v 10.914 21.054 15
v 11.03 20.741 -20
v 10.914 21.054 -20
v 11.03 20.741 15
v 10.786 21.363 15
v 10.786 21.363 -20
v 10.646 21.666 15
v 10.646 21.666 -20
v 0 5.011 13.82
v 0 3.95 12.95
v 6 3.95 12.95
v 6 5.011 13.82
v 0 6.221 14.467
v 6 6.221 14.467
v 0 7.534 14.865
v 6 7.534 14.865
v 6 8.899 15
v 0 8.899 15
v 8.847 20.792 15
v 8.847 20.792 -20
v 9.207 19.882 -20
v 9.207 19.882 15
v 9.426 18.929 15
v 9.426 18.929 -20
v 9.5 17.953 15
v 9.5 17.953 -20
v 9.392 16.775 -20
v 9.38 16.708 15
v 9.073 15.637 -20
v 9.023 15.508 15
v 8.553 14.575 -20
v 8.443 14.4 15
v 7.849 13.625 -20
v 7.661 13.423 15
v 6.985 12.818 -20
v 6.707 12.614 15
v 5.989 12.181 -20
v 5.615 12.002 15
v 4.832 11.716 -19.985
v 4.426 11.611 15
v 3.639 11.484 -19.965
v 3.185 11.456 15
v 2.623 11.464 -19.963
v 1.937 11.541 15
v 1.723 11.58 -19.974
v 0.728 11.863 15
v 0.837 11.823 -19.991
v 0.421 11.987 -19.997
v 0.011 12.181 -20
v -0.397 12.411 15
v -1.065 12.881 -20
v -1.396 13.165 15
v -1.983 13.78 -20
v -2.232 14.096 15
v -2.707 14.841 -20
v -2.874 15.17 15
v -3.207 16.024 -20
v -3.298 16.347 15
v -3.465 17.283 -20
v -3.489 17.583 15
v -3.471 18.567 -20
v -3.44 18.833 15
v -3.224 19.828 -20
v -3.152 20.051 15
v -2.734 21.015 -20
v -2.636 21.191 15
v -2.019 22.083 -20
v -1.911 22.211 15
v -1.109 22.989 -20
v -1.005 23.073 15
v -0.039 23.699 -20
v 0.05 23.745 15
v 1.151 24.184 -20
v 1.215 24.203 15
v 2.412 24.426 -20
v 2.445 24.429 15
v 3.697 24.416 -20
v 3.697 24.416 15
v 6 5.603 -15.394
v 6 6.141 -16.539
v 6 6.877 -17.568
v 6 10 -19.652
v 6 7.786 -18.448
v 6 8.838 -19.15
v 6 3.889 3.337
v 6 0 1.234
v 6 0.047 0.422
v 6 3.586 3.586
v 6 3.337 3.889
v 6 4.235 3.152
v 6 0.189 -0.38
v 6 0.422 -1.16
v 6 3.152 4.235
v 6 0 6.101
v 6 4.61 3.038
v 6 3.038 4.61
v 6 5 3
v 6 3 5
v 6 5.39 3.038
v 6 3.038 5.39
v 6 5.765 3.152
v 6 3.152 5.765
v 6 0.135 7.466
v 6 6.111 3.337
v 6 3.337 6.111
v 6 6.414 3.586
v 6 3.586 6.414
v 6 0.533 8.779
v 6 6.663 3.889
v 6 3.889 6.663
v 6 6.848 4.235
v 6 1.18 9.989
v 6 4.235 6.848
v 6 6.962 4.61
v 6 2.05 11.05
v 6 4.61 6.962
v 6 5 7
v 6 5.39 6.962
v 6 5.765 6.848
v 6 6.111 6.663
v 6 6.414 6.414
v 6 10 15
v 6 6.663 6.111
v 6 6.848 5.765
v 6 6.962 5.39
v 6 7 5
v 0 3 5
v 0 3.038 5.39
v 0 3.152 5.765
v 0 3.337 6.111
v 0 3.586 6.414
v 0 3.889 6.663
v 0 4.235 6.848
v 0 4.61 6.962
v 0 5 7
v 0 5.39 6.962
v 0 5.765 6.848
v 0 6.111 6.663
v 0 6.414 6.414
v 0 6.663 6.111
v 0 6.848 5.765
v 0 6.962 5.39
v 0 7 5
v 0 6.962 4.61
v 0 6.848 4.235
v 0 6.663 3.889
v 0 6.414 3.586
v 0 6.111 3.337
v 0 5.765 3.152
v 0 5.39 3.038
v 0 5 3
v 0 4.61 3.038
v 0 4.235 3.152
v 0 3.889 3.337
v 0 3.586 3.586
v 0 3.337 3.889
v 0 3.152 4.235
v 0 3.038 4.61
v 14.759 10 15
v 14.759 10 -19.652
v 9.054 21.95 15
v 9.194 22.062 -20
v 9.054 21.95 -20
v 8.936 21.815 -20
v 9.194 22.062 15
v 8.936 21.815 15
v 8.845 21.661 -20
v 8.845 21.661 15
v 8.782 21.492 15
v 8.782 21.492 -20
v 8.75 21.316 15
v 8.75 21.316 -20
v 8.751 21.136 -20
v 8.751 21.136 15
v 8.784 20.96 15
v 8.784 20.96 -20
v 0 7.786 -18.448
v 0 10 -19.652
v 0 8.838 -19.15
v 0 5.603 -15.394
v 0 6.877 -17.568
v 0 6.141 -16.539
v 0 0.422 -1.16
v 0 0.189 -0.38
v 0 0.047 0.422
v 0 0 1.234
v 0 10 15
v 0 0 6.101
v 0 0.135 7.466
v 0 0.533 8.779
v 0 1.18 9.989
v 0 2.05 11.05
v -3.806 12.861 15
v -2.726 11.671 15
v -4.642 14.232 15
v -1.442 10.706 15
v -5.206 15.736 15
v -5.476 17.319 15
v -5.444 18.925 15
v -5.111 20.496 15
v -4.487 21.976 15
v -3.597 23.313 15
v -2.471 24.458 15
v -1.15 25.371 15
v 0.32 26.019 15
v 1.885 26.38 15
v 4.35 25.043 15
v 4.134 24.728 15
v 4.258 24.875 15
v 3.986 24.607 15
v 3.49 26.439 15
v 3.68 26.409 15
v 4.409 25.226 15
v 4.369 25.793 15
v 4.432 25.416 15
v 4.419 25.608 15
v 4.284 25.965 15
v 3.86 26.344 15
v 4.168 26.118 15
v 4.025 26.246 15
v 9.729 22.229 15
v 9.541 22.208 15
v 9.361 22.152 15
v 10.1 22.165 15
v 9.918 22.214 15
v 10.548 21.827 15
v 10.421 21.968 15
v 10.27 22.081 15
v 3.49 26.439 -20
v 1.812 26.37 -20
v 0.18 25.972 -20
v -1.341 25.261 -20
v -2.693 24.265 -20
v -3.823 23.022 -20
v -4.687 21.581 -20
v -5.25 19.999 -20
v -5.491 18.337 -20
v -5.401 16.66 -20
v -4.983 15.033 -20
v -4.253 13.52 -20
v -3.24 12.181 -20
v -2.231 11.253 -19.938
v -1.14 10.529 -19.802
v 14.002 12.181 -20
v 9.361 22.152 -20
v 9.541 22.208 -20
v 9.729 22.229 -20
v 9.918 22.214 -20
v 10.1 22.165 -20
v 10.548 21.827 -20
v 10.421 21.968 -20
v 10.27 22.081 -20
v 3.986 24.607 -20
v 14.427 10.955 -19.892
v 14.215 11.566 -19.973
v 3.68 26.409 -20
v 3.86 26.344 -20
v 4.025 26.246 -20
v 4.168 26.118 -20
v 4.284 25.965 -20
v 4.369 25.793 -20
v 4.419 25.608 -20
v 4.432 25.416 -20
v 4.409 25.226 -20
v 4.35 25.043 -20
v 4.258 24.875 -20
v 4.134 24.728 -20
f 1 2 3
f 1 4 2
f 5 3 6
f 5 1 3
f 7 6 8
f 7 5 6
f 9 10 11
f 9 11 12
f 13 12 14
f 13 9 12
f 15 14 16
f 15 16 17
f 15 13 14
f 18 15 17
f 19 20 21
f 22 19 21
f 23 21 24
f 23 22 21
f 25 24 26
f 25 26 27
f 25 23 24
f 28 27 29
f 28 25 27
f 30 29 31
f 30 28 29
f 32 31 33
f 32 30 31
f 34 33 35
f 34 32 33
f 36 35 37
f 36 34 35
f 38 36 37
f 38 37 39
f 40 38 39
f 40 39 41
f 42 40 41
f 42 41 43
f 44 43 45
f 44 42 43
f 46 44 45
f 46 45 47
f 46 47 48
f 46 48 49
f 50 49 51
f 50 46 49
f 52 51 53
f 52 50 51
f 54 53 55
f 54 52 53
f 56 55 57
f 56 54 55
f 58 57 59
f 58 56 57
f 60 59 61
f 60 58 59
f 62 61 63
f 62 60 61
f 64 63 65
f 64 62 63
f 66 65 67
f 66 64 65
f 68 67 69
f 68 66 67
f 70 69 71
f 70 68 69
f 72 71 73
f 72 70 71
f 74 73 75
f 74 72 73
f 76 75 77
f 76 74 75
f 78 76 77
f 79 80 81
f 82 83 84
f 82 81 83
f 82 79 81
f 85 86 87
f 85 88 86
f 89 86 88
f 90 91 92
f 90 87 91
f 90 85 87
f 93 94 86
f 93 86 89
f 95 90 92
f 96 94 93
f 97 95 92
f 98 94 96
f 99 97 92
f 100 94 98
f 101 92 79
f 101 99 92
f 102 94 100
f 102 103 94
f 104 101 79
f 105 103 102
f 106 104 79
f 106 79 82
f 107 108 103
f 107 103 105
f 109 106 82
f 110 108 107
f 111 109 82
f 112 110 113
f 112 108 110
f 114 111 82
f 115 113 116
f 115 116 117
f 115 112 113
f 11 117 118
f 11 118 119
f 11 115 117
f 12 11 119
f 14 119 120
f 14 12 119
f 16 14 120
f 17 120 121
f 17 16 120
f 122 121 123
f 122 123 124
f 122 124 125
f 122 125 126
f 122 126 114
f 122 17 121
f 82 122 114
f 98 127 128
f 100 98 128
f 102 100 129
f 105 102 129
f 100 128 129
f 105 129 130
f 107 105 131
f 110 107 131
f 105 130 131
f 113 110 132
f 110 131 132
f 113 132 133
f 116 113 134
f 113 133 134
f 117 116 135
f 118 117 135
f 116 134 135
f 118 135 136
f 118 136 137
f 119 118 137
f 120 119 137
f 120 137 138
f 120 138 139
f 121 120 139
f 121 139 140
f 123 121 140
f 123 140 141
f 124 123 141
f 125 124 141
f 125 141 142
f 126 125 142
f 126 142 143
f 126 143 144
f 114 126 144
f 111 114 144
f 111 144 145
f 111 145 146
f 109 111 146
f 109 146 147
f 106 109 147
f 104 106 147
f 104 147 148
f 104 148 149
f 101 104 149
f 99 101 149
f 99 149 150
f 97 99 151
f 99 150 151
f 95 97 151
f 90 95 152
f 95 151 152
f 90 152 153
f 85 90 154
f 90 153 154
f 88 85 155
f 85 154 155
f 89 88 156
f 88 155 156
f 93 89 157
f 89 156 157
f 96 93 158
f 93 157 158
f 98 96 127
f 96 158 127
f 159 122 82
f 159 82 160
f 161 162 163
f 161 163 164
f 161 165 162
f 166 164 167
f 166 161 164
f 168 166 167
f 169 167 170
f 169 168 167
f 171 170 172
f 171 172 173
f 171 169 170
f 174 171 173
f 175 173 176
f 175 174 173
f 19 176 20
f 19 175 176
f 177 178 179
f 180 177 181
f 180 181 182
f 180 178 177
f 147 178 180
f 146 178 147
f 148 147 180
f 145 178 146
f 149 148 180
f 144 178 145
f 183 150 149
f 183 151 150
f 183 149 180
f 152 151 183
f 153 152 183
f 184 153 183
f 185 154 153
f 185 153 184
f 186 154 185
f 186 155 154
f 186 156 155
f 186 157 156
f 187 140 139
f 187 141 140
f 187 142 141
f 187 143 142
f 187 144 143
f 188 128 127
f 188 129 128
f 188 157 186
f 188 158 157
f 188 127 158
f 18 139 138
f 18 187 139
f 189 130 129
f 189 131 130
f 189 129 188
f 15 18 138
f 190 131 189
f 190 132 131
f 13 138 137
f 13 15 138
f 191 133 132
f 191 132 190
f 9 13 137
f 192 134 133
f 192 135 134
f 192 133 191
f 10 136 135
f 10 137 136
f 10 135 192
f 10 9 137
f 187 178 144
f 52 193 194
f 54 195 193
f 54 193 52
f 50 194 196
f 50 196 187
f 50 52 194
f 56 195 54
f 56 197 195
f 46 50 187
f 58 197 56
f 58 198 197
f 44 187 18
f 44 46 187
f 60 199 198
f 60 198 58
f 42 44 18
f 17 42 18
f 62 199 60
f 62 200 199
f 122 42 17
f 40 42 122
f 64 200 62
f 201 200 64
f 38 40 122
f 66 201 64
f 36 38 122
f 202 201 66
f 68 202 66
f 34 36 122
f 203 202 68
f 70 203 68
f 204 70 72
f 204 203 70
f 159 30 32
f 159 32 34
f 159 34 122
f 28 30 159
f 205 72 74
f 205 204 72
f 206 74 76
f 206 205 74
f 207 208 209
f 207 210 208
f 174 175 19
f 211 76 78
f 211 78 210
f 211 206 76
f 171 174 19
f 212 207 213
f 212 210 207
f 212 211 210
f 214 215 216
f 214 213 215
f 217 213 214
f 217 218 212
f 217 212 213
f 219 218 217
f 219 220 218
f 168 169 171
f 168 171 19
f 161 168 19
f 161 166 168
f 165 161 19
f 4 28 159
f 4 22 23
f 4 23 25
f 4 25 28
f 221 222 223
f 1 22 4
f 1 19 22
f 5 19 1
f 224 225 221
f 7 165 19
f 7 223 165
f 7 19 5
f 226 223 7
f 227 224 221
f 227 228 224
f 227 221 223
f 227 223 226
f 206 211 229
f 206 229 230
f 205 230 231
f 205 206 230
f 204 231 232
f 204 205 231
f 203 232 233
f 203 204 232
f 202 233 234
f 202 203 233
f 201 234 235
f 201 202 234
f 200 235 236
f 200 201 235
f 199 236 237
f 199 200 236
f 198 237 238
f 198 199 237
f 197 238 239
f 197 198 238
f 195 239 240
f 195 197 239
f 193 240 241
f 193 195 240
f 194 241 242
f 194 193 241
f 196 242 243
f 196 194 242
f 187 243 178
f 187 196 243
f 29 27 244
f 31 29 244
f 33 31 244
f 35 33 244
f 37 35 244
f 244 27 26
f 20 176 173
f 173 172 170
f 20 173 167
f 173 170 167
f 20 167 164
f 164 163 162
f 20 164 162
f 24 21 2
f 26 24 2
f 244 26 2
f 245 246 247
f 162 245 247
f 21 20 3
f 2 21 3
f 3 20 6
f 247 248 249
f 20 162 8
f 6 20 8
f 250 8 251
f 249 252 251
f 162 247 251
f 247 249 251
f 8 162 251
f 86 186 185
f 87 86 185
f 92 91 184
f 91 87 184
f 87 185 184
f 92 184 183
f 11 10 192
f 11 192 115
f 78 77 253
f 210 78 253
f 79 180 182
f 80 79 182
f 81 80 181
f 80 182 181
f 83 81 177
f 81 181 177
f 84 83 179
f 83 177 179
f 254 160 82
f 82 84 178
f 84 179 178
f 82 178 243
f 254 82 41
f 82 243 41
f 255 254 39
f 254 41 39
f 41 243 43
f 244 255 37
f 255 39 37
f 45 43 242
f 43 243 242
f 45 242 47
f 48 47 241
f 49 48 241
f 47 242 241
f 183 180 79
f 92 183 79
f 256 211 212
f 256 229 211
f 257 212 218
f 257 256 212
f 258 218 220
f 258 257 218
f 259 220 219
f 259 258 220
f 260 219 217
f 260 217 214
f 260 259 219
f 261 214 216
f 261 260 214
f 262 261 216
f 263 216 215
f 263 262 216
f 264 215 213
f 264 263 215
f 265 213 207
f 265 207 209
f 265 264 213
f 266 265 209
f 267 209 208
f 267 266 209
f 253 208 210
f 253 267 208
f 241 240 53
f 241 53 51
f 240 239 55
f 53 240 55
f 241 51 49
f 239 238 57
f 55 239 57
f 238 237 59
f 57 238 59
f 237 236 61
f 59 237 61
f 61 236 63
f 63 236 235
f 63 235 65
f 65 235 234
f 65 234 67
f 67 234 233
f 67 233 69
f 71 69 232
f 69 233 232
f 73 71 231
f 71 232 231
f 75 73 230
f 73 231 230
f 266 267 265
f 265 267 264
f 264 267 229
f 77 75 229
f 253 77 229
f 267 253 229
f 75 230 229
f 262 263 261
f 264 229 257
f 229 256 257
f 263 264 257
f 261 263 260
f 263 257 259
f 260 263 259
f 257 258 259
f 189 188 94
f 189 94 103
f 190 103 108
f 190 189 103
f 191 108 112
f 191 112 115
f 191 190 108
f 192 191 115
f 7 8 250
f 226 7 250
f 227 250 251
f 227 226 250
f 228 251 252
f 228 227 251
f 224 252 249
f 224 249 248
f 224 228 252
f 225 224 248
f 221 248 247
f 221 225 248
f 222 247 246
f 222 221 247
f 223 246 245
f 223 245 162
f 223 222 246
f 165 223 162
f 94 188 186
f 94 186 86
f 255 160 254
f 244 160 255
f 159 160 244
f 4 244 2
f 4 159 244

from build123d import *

# Parameters (mm, degrees)
F1_DEPTH      = 15
F1_DEPTH_BACK = 20
F2_R          = 2
F3_DEPTH      = 14.7596476454
F4_R          = 0.99999
F5_SIZE2      = 7.2794046853
F5_SIZE       = 20
F6_SIZE       = 6
F7_T1_DEPTH   = 20.4974746831
F7_T3_DEPTH   = 30.5072638373
F7_T5_DEPTH   = 12.1714443248


# Not quite as in the source:
# - a fillet or chamfer that OpenCascade refuses, or shapes differently, is made with other operations: its cross-section is extruded or revolved along the edge and cut away or added
# - a fillet or chamfer is up to 0.001 mm smaller than in the source, because OpenCascade refuses the exact size
# - a feature names something its author has since deleted; it is built from what else it names


with BuildPart() as f1:
    # F0 (on Top) → F1 (new body, two sides)
    with BuildSketch(Plane.XY) as f1_sk:
        with BuildLine():
            Line((0, 10), (0, 0))
            Line((0, 0), (6, 0))
            Line((6, 0), (6, 10))
            ThreePointArc((6, 10), (3, 9.4529868603), (0, 10))
        make_face()
        with BuildLine():
            ThreePointArc((11.5, 17.9529868603), (9.9910657271, 13.1182169588), (6, 10))
            Line((6, 10), (14.7586476454, 10))
            Line((14.7586476454, 10), (11.0298702995, 20.7406710197))
            ThreePointArc((11.0298702995, 20.7406710197), (11.3816435604, 19.3665112594), (11.5, 17.9529868603))
        make_face()
        with BuildLine():
            ThreePointArc((5.9635743738, 25.9196189549), (-4.9598303138, 20.9347818526), (0, 10))
            ThreePointArc((0, 10), (3, 9.4529868603), (6, 10))
            ThreePointArc((6, 10), (9.9910657271, 13.1182169588), (11.5, 17.9529868603))
            ThreePointArc((11.5, 17.9529868603), (11.3816435604, 19.3665112594), (11.0298702995, 20.7406710197))
            ThreePointArc((11.0298702995, 20.7406710197), (10.6165760284, 21.7262837746), (10.0828666254, 22.6522421594))
            Line((10.0828666254, 22.6522421594), (8.4163097724, 21.5465350302))
            ThreePointArc((8.4163097724, 21.5465350302), (9.2231830087, 19.8296842892), (9.5, 17.9529868603))
            ThreePointArc((9.5, 17.9529868603), (-1.83621149, 13.6100548526), (3.6965974081, 24.4155522991))
            Line((3.6965974081, 24.4155522991), (5.9635743738, 25.9196189549))
        make_face()
    extrude(amount=F1_DEPTH)
    extrude(f1_sk.sketch, amount=-F1_DEPTH_BACK)

    # F2 (on face) → F3 (cut, through all)
    with BuildSketch(Plane(origin=(0, 0, 0), x_dir=(0, -1, 0), z_dir=(-1, 0, 0))):
        with Locations((-5, 5)):
            Circle(F2_R)
    extrude(amount=-F3_DEPTH, mode=Mode.SUBTRACT)

    # F4 (radius 1 in the source; OpenCascade refuses exactly that, so slightly less here)
    f4_edges = [f1.edges().sort_by_distance(p)[0] for p in [
        (5.963574, 25.919619, -2.5),
        (8.41631, 21.546535, -2.5),
        (10.082867, 22.652242, -2.5),
    ]]
    fillet(f4_edges, radius=F4_R)

    # F5
    f5_edges = [f1.edges().sort_by_distance(p)[0] for p in [
        (3, 0, -20),
    ]]
    f5_side = f1.faces().sort_by_distance((3, 0, -2.5))[0]
    chamfer(f5_edges, length=F5_SIZE, length2=F5_SIZE2, reference=f5_side)

    # F6
    f6_edges = [f1.edges().sort_by_distance(p)[0] for p in [
        (3, 0, 15),
    ]]
    chamfer(f6_edges, length=F6_SIZE)

    # F7: fillet of radius 7 on 4 edges, made by hand

    # F7_s2 → F7_t1 (cut)
    with BuildSketch(Plane.YZ.offset(-7.2487373415)):
        with BuildLine():
            ThreePointArc((0, 6.1005050634), (0.5328432724, 8.7792890899), (2.0502525317, 11.0502525317))
            Line((2.0502525317, 11.0502525317), (0, 9))
            Line((0, 9), (0, 6.1005050634))
        make_face()
        with BuildLine():
            ThreePointArc((3.9497474683, 12.9497474683), (6.2207109101, 14.4671567276), (8.8994949366, 15))
            Line((8.8994949366, 15), (6, 15))
            Line((6, 15), (3.9497474683, 12.9497474683))
        make_face()
    extrude(amount=F7_T1_DEPTH, mode=Mode.SUBTRACT)

    # F7_s4 → F7_t3 (cut)
    with BuildSketch(Plane.YZ.offset(-12.2536319187)):
        with BuildLine():
            ThreePointArc((5.6030091073, -15.3941410033), (8.1658223983, -18.73406431), (12.1808574528, -20))
            Line((12.1808574528, -20), (7.2794046853, -20))
            Line((7.2794046853, -20), (5.6030091073, -15.3941410033))
        make_face()
    extrude(amount=F7_T3_DEPTH, mode=Mode.SUBTRACT)

    # F7_s6 → F7_t5 (cut)
    with BuildSketch(Plane.YZ.offset(-3.0857221624)):
        with BuildLine():
            ThreePointArc((0, 1.234288865), (0.1063457289, 0.0187516213), (0.4221516545, -1.1598521383))
            Line((0.4221516545, -1.1598521383), (0, 0))
            Line((0, 0), (0, 1.234288865))
        make_face()
    extrude(amount=F7_T5_DEPTH, mode=Mode.SUBTRACT)


solid = f1.part
